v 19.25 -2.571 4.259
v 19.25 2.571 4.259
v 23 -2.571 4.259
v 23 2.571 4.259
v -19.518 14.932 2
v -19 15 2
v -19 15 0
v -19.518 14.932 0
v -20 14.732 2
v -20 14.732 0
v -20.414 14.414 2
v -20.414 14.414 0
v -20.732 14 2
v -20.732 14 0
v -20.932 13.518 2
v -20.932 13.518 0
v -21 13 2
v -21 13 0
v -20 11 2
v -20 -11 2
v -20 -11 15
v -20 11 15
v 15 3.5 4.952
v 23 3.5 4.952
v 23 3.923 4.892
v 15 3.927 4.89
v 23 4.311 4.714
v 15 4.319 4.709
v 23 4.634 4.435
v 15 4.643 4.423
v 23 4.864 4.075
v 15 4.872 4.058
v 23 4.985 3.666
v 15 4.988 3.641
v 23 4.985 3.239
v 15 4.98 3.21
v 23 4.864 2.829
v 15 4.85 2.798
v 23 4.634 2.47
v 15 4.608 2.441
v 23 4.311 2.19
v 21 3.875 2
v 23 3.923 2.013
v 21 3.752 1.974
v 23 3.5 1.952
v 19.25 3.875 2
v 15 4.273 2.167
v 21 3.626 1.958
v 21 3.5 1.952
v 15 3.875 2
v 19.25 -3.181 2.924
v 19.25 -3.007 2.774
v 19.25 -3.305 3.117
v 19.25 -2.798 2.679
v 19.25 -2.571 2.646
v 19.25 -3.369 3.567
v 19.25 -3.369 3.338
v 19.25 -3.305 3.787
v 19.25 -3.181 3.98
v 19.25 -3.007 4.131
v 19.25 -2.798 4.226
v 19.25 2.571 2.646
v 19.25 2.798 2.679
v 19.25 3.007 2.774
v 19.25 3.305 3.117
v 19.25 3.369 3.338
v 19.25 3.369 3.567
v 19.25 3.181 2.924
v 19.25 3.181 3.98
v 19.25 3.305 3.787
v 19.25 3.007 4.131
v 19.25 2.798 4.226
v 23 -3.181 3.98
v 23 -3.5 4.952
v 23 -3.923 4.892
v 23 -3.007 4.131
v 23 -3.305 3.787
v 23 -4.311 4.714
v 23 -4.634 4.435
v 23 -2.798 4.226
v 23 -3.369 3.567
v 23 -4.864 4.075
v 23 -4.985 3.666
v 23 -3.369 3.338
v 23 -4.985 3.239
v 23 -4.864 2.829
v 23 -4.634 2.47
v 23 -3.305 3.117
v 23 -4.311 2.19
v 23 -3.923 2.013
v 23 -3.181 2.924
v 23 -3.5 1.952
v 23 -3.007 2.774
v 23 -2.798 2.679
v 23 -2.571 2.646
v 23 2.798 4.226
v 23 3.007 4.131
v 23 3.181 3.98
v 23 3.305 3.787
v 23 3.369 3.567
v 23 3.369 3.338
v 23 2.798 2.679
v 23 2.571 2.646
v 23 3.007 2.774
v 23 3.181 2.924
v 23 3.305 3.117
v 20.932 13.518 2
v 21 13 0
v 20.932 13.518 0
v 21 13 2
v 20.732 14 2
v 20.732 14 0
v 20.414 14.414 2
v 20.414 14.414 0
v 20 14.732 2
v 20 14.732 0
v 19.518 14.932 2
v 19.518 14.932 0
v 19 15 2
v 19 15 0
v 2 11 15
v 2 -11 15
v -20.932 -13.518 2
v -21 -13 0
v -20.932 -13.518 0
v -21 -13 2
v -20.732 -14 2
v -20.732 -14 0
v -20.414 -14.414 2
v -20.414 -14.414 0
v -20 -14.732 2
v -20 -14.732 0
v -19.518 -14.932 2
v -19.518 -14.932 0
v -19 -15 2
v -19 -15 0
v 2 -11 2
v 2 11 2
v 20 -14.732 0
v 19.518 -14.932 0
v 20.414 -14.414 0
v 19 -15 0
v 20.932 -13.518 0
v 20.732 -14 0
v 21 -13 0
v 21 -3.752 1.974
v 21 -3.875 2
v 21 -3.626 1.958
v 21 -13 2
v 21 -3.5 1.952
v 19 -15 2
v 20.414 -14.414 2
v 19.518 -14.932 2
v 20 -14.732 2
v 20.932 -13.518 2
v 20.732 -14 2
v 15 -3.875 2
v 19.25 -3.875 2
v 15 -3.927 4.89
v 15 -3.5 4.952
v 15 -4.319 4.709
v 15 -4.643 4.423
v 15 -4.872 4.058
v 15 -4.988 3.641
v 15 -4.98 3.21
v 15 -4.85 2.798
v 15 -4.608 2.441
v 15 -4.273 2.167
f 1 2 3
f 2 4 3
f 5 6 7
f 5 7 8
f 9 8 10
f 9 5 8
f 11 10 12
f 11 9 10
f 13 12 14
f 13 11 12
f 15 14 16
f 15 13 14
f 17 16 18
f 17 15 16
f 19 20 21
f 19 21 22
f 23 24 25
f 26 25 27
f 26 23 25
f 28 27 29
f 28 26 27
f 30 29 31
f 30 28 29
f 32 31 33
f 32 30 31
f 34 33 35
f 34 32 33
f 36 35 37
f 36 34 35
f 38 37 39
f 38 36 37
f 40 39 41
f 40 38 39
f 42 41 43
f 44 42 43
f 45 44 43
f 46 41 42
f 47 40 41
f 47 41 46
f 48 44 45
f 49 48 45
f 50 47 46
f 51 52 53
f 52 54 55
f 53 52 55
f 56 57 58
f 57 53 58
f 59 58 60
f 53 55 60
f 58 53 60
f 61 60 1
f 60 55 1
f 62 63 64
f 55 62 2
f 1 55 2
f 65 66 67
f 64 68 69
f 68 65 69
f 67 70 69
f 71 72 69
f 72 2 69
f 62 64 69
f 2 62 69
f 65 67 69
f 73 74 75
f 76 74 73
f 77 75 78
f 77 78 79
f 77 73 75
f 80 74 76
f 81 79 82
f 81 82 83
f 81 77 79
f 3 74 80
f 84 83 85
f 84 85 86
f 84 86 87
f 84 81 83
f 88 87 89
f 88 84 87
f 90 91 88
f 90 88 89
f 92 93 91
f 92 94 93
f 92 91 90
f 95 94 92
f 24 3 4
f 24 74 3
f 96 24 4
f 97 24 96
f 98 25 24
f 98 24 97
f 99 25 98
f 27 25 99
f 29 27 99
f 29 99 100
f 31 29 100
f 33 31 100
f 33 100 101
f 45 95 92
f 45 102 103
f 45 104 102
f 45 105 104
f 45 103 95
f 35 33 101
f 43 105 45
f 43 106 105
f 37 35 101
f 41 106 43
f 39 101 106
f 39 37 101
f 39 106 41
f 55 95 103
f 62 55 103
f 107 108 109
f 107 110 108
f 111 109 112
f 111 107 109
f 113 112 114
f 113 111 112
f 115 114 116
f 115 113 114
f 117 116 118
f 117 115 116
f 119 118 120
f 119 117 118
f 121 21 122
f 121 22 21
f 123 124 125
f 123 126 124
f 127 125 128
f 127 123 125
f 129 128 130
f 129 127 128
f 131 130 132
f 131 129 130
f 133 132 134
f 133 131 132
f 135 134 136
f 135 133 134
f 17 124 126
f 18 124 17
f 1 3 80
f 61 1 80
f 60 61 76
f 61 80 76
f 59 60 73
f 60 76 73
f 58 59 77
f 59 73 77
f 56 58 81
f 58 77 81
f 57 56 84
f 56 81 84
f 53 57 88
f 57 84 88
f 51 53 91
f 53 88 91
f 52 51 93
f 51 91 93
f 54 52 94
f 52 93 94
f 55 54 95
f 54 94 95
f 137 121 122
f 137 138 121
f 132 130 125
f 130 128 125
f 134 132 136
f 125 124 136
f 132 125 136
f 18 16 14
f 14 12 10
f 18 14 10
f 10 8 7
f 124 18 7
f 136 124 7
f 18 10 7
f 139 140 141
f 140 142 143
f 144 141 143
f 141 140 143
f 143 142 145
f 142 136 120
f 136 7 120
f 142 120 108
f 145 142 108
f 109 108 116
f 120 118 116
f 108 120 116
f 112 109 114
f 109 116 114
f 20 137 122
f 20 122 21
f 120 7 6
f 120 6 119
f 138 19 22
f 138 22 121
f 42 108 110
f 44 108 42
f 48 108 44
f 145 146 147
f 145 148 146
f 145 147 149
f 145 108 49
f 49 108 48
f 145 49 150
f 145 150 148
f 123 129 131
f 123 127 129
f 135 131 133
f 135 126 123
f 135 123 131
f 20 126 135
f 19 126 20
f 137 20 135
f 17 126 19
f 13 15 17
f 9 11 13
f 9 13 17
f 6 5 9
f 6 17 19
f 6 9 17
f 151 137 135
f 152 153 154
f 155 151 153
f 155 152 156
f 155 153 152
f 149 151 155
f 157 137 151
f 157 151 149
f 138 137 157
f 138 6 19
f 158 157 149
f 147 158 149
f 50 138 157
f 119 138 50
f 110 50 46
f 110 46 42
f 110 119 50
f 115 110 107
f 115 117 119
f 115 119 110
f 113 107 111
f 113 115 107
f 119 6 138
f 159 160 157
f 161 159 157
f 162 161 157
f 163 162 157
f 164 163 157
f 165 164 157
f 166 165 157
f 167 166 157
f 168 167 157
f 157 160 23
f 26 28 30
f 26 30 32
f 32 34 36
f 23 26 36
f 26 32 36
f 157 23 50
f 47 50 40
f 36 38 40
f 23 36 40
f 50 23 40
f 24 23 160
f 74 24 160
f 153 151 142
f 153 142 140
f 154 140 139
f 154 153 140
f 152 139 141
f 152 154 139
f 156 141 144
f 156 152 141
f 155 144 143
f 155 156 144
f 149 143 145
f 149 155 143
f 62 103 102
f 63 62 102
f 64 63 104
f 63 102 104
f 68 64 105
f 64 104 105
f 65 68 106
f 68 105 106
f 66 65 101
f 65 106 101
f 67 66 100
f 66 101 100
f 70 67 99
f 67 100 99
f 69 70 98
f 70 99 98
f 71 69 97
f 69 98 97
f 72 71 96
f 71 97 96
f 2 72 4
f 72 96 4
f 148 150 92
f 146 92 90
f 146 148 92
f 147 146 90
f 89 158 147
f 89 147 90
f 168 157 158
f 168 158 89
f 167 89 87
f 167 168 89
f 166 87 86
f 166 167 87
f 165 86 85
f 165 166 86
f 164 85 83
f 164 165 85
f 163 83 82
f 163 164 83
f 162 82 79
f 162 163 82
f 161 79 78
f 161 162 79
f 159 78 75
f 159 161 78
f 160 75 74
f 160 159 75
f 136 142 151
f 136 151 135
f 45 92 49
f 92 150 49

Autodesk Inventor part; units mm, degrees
ref_plane "YZ Plane" through (0, 0, 0) normal (1, 0, 0) x (0, 1, 0)
ref_plane "XZ Plane" through (0, 0, 0) normal (0, 1, 0) x (-1, 0, 0)
ref_plane "XY Plane" through (0, 0, 0) normal (0, 0, 1) x (1, 0, 0)
sketch "草图1" plane through (0, 0, 0) normal (0, 0, 1) x (1, 0, 0)
  line L0 (21, -15) -> (-21, -15)
  line L1 (-21, -15) -> (-21, 15)
  line L2 (-21, 15) -> (21, 15)
  line L3 (21, 15) -> (21, -15)
  line L4 (21, -15) -> (-21, 15) construction
  line L5 (-21, -15) -> (21, 15) construction
  point P0 (0, 0)
  dimension "d0" = 42
  dimension "d1" = 30
extrude "拉伸1" add sketch "草图1" along normal blind 2
sketch "草图2" plane through (0, 0, 2) normal (0, 0, 1) x (1, 0, 0)
  line L0 (2, -11) -> (-20, -11)
  line L1 (-20, -11) -> (-20, 11)
  line L2 (-20, 11) -> (2, 11)
  line L3 (2, 11) -> (2, -11)
  line L4 (2, -11) -> (-20, 11) construction
  line L5 (-20, -11) -> (2, 11) construction
  line L6 (-21, 15) -> (-21, -15) projected
  point P0 (0, 0)
  point P1 (-9, 0)
  dimension "d4" = 22
  dimension "d5" = 22
  dimension "d6" = 1
extrude "拉伸2" add sketch "草图2" along normal blind 13
sketch "草图3" plane through (0, 0, 2) normal (0, 0, 1) x (1, 0, 0)
  point P0 (0, 0)
sketch "草图4" plane through (21, -15, 0) normal (1, 0, 0) x (0, 0, -1)
  line L0 (0, 15) -> (-5.9619, 15)
  line L1 (-3.4523, 11.5) -> (-3.4523, 18.5) construction
  line L2 (-1.9523, 11.5) -> (-1.9523, 18.5)
  line L3 (-4.9523, 18.5) -> (-4.9523, 11.5)
  arc A0 (-4.9523, 11.5) -> (-1.9523, 11.5) centre (-3.4523, 11.5) ccw
  arc A1 (-1.9523, 18.5) -> (-4.9523, 18.5) centre (-3.4523, 18.5) ccw
  line L4 (-3.4523, 12.4289) -> (-3.4523, 17.5711) construction
  line L5 (-2.6459, 12.4289) -> (-2.6459, 17.5711)
  line L6 (-4.2587, 17.5711) -> (-4.2587, 12.4289)
  arc A2 (-4.2587, 12.4289) -> (-2.6459, 12.4289) centre (-3.4523, 12.4289) ccw
  arc A3 (-2.6459, 17.5711) -> (-4.2587, 17.5711) centre (-3.4523, 17.5711) ccw
  point P0 (-3.4523, 15)
  point P1 (-3.4523, 10)
  point P2 (-3.4523, 20)
  dimension "d9" = 3
  dimension "d10" = 10
extrude "拉伸3" add sketch "草图4" against normal blind 6 contours L2 A0 L3 L0 L6 A2 L5 | L0 L5 A3 L6 L3 A1 L2
extrude "拉伸4" add sketch "草图4" along normal blind 2 contours L2 A0 L3 L0 L6 A2 L5 | L0 L5 A3 L6 L3 A1 L2
sketch "草图5" plane through (15, -15, 0) normal (-1, 0, 0) x (0, 0, 1)
  line L0 (2.6459, 12.4289) -> (2.6459, 17.5711) projected
  arc A0 (4.2587, 17.5711) -> (2.6459, 17.5711) centre (3.4523, 17.5711) ccw projected
  line L1 (4.2587, 17.5711) -> (4.2587, 12.4289) projected
  arc A1 (2.6459, 12.4289) -> (4.2587, 12.4289) centre (3.4523, 12.4289) ccw projected
  line L2 (2, 11.1247) -> (2, 18.8753) projected
  arc A2 (2, 11.1247) -> (4.9523, 11.5) centre (3.4523, 11.5) ccw projected
  line L3 (4.9523, 11.5) -> (4.9523, 18.5) projected
  arc A3 (4.9523, 18.5) -> (2, 18.8753) centre (3.4523, 18.5) ccw projected
  point P0 (0, 15)
extrude "拉伸5" add sketch "草图5" against normal blind 4.25 contours L0 A0 L1 A1 | L2 A3 L3 A2
fillet "圆角1" radius 2 4 edges at (21, -15, 1) (-21, -15, 1) (21, 15, 1) (-21, 15, 1)
properties part number "陀螺仪"
